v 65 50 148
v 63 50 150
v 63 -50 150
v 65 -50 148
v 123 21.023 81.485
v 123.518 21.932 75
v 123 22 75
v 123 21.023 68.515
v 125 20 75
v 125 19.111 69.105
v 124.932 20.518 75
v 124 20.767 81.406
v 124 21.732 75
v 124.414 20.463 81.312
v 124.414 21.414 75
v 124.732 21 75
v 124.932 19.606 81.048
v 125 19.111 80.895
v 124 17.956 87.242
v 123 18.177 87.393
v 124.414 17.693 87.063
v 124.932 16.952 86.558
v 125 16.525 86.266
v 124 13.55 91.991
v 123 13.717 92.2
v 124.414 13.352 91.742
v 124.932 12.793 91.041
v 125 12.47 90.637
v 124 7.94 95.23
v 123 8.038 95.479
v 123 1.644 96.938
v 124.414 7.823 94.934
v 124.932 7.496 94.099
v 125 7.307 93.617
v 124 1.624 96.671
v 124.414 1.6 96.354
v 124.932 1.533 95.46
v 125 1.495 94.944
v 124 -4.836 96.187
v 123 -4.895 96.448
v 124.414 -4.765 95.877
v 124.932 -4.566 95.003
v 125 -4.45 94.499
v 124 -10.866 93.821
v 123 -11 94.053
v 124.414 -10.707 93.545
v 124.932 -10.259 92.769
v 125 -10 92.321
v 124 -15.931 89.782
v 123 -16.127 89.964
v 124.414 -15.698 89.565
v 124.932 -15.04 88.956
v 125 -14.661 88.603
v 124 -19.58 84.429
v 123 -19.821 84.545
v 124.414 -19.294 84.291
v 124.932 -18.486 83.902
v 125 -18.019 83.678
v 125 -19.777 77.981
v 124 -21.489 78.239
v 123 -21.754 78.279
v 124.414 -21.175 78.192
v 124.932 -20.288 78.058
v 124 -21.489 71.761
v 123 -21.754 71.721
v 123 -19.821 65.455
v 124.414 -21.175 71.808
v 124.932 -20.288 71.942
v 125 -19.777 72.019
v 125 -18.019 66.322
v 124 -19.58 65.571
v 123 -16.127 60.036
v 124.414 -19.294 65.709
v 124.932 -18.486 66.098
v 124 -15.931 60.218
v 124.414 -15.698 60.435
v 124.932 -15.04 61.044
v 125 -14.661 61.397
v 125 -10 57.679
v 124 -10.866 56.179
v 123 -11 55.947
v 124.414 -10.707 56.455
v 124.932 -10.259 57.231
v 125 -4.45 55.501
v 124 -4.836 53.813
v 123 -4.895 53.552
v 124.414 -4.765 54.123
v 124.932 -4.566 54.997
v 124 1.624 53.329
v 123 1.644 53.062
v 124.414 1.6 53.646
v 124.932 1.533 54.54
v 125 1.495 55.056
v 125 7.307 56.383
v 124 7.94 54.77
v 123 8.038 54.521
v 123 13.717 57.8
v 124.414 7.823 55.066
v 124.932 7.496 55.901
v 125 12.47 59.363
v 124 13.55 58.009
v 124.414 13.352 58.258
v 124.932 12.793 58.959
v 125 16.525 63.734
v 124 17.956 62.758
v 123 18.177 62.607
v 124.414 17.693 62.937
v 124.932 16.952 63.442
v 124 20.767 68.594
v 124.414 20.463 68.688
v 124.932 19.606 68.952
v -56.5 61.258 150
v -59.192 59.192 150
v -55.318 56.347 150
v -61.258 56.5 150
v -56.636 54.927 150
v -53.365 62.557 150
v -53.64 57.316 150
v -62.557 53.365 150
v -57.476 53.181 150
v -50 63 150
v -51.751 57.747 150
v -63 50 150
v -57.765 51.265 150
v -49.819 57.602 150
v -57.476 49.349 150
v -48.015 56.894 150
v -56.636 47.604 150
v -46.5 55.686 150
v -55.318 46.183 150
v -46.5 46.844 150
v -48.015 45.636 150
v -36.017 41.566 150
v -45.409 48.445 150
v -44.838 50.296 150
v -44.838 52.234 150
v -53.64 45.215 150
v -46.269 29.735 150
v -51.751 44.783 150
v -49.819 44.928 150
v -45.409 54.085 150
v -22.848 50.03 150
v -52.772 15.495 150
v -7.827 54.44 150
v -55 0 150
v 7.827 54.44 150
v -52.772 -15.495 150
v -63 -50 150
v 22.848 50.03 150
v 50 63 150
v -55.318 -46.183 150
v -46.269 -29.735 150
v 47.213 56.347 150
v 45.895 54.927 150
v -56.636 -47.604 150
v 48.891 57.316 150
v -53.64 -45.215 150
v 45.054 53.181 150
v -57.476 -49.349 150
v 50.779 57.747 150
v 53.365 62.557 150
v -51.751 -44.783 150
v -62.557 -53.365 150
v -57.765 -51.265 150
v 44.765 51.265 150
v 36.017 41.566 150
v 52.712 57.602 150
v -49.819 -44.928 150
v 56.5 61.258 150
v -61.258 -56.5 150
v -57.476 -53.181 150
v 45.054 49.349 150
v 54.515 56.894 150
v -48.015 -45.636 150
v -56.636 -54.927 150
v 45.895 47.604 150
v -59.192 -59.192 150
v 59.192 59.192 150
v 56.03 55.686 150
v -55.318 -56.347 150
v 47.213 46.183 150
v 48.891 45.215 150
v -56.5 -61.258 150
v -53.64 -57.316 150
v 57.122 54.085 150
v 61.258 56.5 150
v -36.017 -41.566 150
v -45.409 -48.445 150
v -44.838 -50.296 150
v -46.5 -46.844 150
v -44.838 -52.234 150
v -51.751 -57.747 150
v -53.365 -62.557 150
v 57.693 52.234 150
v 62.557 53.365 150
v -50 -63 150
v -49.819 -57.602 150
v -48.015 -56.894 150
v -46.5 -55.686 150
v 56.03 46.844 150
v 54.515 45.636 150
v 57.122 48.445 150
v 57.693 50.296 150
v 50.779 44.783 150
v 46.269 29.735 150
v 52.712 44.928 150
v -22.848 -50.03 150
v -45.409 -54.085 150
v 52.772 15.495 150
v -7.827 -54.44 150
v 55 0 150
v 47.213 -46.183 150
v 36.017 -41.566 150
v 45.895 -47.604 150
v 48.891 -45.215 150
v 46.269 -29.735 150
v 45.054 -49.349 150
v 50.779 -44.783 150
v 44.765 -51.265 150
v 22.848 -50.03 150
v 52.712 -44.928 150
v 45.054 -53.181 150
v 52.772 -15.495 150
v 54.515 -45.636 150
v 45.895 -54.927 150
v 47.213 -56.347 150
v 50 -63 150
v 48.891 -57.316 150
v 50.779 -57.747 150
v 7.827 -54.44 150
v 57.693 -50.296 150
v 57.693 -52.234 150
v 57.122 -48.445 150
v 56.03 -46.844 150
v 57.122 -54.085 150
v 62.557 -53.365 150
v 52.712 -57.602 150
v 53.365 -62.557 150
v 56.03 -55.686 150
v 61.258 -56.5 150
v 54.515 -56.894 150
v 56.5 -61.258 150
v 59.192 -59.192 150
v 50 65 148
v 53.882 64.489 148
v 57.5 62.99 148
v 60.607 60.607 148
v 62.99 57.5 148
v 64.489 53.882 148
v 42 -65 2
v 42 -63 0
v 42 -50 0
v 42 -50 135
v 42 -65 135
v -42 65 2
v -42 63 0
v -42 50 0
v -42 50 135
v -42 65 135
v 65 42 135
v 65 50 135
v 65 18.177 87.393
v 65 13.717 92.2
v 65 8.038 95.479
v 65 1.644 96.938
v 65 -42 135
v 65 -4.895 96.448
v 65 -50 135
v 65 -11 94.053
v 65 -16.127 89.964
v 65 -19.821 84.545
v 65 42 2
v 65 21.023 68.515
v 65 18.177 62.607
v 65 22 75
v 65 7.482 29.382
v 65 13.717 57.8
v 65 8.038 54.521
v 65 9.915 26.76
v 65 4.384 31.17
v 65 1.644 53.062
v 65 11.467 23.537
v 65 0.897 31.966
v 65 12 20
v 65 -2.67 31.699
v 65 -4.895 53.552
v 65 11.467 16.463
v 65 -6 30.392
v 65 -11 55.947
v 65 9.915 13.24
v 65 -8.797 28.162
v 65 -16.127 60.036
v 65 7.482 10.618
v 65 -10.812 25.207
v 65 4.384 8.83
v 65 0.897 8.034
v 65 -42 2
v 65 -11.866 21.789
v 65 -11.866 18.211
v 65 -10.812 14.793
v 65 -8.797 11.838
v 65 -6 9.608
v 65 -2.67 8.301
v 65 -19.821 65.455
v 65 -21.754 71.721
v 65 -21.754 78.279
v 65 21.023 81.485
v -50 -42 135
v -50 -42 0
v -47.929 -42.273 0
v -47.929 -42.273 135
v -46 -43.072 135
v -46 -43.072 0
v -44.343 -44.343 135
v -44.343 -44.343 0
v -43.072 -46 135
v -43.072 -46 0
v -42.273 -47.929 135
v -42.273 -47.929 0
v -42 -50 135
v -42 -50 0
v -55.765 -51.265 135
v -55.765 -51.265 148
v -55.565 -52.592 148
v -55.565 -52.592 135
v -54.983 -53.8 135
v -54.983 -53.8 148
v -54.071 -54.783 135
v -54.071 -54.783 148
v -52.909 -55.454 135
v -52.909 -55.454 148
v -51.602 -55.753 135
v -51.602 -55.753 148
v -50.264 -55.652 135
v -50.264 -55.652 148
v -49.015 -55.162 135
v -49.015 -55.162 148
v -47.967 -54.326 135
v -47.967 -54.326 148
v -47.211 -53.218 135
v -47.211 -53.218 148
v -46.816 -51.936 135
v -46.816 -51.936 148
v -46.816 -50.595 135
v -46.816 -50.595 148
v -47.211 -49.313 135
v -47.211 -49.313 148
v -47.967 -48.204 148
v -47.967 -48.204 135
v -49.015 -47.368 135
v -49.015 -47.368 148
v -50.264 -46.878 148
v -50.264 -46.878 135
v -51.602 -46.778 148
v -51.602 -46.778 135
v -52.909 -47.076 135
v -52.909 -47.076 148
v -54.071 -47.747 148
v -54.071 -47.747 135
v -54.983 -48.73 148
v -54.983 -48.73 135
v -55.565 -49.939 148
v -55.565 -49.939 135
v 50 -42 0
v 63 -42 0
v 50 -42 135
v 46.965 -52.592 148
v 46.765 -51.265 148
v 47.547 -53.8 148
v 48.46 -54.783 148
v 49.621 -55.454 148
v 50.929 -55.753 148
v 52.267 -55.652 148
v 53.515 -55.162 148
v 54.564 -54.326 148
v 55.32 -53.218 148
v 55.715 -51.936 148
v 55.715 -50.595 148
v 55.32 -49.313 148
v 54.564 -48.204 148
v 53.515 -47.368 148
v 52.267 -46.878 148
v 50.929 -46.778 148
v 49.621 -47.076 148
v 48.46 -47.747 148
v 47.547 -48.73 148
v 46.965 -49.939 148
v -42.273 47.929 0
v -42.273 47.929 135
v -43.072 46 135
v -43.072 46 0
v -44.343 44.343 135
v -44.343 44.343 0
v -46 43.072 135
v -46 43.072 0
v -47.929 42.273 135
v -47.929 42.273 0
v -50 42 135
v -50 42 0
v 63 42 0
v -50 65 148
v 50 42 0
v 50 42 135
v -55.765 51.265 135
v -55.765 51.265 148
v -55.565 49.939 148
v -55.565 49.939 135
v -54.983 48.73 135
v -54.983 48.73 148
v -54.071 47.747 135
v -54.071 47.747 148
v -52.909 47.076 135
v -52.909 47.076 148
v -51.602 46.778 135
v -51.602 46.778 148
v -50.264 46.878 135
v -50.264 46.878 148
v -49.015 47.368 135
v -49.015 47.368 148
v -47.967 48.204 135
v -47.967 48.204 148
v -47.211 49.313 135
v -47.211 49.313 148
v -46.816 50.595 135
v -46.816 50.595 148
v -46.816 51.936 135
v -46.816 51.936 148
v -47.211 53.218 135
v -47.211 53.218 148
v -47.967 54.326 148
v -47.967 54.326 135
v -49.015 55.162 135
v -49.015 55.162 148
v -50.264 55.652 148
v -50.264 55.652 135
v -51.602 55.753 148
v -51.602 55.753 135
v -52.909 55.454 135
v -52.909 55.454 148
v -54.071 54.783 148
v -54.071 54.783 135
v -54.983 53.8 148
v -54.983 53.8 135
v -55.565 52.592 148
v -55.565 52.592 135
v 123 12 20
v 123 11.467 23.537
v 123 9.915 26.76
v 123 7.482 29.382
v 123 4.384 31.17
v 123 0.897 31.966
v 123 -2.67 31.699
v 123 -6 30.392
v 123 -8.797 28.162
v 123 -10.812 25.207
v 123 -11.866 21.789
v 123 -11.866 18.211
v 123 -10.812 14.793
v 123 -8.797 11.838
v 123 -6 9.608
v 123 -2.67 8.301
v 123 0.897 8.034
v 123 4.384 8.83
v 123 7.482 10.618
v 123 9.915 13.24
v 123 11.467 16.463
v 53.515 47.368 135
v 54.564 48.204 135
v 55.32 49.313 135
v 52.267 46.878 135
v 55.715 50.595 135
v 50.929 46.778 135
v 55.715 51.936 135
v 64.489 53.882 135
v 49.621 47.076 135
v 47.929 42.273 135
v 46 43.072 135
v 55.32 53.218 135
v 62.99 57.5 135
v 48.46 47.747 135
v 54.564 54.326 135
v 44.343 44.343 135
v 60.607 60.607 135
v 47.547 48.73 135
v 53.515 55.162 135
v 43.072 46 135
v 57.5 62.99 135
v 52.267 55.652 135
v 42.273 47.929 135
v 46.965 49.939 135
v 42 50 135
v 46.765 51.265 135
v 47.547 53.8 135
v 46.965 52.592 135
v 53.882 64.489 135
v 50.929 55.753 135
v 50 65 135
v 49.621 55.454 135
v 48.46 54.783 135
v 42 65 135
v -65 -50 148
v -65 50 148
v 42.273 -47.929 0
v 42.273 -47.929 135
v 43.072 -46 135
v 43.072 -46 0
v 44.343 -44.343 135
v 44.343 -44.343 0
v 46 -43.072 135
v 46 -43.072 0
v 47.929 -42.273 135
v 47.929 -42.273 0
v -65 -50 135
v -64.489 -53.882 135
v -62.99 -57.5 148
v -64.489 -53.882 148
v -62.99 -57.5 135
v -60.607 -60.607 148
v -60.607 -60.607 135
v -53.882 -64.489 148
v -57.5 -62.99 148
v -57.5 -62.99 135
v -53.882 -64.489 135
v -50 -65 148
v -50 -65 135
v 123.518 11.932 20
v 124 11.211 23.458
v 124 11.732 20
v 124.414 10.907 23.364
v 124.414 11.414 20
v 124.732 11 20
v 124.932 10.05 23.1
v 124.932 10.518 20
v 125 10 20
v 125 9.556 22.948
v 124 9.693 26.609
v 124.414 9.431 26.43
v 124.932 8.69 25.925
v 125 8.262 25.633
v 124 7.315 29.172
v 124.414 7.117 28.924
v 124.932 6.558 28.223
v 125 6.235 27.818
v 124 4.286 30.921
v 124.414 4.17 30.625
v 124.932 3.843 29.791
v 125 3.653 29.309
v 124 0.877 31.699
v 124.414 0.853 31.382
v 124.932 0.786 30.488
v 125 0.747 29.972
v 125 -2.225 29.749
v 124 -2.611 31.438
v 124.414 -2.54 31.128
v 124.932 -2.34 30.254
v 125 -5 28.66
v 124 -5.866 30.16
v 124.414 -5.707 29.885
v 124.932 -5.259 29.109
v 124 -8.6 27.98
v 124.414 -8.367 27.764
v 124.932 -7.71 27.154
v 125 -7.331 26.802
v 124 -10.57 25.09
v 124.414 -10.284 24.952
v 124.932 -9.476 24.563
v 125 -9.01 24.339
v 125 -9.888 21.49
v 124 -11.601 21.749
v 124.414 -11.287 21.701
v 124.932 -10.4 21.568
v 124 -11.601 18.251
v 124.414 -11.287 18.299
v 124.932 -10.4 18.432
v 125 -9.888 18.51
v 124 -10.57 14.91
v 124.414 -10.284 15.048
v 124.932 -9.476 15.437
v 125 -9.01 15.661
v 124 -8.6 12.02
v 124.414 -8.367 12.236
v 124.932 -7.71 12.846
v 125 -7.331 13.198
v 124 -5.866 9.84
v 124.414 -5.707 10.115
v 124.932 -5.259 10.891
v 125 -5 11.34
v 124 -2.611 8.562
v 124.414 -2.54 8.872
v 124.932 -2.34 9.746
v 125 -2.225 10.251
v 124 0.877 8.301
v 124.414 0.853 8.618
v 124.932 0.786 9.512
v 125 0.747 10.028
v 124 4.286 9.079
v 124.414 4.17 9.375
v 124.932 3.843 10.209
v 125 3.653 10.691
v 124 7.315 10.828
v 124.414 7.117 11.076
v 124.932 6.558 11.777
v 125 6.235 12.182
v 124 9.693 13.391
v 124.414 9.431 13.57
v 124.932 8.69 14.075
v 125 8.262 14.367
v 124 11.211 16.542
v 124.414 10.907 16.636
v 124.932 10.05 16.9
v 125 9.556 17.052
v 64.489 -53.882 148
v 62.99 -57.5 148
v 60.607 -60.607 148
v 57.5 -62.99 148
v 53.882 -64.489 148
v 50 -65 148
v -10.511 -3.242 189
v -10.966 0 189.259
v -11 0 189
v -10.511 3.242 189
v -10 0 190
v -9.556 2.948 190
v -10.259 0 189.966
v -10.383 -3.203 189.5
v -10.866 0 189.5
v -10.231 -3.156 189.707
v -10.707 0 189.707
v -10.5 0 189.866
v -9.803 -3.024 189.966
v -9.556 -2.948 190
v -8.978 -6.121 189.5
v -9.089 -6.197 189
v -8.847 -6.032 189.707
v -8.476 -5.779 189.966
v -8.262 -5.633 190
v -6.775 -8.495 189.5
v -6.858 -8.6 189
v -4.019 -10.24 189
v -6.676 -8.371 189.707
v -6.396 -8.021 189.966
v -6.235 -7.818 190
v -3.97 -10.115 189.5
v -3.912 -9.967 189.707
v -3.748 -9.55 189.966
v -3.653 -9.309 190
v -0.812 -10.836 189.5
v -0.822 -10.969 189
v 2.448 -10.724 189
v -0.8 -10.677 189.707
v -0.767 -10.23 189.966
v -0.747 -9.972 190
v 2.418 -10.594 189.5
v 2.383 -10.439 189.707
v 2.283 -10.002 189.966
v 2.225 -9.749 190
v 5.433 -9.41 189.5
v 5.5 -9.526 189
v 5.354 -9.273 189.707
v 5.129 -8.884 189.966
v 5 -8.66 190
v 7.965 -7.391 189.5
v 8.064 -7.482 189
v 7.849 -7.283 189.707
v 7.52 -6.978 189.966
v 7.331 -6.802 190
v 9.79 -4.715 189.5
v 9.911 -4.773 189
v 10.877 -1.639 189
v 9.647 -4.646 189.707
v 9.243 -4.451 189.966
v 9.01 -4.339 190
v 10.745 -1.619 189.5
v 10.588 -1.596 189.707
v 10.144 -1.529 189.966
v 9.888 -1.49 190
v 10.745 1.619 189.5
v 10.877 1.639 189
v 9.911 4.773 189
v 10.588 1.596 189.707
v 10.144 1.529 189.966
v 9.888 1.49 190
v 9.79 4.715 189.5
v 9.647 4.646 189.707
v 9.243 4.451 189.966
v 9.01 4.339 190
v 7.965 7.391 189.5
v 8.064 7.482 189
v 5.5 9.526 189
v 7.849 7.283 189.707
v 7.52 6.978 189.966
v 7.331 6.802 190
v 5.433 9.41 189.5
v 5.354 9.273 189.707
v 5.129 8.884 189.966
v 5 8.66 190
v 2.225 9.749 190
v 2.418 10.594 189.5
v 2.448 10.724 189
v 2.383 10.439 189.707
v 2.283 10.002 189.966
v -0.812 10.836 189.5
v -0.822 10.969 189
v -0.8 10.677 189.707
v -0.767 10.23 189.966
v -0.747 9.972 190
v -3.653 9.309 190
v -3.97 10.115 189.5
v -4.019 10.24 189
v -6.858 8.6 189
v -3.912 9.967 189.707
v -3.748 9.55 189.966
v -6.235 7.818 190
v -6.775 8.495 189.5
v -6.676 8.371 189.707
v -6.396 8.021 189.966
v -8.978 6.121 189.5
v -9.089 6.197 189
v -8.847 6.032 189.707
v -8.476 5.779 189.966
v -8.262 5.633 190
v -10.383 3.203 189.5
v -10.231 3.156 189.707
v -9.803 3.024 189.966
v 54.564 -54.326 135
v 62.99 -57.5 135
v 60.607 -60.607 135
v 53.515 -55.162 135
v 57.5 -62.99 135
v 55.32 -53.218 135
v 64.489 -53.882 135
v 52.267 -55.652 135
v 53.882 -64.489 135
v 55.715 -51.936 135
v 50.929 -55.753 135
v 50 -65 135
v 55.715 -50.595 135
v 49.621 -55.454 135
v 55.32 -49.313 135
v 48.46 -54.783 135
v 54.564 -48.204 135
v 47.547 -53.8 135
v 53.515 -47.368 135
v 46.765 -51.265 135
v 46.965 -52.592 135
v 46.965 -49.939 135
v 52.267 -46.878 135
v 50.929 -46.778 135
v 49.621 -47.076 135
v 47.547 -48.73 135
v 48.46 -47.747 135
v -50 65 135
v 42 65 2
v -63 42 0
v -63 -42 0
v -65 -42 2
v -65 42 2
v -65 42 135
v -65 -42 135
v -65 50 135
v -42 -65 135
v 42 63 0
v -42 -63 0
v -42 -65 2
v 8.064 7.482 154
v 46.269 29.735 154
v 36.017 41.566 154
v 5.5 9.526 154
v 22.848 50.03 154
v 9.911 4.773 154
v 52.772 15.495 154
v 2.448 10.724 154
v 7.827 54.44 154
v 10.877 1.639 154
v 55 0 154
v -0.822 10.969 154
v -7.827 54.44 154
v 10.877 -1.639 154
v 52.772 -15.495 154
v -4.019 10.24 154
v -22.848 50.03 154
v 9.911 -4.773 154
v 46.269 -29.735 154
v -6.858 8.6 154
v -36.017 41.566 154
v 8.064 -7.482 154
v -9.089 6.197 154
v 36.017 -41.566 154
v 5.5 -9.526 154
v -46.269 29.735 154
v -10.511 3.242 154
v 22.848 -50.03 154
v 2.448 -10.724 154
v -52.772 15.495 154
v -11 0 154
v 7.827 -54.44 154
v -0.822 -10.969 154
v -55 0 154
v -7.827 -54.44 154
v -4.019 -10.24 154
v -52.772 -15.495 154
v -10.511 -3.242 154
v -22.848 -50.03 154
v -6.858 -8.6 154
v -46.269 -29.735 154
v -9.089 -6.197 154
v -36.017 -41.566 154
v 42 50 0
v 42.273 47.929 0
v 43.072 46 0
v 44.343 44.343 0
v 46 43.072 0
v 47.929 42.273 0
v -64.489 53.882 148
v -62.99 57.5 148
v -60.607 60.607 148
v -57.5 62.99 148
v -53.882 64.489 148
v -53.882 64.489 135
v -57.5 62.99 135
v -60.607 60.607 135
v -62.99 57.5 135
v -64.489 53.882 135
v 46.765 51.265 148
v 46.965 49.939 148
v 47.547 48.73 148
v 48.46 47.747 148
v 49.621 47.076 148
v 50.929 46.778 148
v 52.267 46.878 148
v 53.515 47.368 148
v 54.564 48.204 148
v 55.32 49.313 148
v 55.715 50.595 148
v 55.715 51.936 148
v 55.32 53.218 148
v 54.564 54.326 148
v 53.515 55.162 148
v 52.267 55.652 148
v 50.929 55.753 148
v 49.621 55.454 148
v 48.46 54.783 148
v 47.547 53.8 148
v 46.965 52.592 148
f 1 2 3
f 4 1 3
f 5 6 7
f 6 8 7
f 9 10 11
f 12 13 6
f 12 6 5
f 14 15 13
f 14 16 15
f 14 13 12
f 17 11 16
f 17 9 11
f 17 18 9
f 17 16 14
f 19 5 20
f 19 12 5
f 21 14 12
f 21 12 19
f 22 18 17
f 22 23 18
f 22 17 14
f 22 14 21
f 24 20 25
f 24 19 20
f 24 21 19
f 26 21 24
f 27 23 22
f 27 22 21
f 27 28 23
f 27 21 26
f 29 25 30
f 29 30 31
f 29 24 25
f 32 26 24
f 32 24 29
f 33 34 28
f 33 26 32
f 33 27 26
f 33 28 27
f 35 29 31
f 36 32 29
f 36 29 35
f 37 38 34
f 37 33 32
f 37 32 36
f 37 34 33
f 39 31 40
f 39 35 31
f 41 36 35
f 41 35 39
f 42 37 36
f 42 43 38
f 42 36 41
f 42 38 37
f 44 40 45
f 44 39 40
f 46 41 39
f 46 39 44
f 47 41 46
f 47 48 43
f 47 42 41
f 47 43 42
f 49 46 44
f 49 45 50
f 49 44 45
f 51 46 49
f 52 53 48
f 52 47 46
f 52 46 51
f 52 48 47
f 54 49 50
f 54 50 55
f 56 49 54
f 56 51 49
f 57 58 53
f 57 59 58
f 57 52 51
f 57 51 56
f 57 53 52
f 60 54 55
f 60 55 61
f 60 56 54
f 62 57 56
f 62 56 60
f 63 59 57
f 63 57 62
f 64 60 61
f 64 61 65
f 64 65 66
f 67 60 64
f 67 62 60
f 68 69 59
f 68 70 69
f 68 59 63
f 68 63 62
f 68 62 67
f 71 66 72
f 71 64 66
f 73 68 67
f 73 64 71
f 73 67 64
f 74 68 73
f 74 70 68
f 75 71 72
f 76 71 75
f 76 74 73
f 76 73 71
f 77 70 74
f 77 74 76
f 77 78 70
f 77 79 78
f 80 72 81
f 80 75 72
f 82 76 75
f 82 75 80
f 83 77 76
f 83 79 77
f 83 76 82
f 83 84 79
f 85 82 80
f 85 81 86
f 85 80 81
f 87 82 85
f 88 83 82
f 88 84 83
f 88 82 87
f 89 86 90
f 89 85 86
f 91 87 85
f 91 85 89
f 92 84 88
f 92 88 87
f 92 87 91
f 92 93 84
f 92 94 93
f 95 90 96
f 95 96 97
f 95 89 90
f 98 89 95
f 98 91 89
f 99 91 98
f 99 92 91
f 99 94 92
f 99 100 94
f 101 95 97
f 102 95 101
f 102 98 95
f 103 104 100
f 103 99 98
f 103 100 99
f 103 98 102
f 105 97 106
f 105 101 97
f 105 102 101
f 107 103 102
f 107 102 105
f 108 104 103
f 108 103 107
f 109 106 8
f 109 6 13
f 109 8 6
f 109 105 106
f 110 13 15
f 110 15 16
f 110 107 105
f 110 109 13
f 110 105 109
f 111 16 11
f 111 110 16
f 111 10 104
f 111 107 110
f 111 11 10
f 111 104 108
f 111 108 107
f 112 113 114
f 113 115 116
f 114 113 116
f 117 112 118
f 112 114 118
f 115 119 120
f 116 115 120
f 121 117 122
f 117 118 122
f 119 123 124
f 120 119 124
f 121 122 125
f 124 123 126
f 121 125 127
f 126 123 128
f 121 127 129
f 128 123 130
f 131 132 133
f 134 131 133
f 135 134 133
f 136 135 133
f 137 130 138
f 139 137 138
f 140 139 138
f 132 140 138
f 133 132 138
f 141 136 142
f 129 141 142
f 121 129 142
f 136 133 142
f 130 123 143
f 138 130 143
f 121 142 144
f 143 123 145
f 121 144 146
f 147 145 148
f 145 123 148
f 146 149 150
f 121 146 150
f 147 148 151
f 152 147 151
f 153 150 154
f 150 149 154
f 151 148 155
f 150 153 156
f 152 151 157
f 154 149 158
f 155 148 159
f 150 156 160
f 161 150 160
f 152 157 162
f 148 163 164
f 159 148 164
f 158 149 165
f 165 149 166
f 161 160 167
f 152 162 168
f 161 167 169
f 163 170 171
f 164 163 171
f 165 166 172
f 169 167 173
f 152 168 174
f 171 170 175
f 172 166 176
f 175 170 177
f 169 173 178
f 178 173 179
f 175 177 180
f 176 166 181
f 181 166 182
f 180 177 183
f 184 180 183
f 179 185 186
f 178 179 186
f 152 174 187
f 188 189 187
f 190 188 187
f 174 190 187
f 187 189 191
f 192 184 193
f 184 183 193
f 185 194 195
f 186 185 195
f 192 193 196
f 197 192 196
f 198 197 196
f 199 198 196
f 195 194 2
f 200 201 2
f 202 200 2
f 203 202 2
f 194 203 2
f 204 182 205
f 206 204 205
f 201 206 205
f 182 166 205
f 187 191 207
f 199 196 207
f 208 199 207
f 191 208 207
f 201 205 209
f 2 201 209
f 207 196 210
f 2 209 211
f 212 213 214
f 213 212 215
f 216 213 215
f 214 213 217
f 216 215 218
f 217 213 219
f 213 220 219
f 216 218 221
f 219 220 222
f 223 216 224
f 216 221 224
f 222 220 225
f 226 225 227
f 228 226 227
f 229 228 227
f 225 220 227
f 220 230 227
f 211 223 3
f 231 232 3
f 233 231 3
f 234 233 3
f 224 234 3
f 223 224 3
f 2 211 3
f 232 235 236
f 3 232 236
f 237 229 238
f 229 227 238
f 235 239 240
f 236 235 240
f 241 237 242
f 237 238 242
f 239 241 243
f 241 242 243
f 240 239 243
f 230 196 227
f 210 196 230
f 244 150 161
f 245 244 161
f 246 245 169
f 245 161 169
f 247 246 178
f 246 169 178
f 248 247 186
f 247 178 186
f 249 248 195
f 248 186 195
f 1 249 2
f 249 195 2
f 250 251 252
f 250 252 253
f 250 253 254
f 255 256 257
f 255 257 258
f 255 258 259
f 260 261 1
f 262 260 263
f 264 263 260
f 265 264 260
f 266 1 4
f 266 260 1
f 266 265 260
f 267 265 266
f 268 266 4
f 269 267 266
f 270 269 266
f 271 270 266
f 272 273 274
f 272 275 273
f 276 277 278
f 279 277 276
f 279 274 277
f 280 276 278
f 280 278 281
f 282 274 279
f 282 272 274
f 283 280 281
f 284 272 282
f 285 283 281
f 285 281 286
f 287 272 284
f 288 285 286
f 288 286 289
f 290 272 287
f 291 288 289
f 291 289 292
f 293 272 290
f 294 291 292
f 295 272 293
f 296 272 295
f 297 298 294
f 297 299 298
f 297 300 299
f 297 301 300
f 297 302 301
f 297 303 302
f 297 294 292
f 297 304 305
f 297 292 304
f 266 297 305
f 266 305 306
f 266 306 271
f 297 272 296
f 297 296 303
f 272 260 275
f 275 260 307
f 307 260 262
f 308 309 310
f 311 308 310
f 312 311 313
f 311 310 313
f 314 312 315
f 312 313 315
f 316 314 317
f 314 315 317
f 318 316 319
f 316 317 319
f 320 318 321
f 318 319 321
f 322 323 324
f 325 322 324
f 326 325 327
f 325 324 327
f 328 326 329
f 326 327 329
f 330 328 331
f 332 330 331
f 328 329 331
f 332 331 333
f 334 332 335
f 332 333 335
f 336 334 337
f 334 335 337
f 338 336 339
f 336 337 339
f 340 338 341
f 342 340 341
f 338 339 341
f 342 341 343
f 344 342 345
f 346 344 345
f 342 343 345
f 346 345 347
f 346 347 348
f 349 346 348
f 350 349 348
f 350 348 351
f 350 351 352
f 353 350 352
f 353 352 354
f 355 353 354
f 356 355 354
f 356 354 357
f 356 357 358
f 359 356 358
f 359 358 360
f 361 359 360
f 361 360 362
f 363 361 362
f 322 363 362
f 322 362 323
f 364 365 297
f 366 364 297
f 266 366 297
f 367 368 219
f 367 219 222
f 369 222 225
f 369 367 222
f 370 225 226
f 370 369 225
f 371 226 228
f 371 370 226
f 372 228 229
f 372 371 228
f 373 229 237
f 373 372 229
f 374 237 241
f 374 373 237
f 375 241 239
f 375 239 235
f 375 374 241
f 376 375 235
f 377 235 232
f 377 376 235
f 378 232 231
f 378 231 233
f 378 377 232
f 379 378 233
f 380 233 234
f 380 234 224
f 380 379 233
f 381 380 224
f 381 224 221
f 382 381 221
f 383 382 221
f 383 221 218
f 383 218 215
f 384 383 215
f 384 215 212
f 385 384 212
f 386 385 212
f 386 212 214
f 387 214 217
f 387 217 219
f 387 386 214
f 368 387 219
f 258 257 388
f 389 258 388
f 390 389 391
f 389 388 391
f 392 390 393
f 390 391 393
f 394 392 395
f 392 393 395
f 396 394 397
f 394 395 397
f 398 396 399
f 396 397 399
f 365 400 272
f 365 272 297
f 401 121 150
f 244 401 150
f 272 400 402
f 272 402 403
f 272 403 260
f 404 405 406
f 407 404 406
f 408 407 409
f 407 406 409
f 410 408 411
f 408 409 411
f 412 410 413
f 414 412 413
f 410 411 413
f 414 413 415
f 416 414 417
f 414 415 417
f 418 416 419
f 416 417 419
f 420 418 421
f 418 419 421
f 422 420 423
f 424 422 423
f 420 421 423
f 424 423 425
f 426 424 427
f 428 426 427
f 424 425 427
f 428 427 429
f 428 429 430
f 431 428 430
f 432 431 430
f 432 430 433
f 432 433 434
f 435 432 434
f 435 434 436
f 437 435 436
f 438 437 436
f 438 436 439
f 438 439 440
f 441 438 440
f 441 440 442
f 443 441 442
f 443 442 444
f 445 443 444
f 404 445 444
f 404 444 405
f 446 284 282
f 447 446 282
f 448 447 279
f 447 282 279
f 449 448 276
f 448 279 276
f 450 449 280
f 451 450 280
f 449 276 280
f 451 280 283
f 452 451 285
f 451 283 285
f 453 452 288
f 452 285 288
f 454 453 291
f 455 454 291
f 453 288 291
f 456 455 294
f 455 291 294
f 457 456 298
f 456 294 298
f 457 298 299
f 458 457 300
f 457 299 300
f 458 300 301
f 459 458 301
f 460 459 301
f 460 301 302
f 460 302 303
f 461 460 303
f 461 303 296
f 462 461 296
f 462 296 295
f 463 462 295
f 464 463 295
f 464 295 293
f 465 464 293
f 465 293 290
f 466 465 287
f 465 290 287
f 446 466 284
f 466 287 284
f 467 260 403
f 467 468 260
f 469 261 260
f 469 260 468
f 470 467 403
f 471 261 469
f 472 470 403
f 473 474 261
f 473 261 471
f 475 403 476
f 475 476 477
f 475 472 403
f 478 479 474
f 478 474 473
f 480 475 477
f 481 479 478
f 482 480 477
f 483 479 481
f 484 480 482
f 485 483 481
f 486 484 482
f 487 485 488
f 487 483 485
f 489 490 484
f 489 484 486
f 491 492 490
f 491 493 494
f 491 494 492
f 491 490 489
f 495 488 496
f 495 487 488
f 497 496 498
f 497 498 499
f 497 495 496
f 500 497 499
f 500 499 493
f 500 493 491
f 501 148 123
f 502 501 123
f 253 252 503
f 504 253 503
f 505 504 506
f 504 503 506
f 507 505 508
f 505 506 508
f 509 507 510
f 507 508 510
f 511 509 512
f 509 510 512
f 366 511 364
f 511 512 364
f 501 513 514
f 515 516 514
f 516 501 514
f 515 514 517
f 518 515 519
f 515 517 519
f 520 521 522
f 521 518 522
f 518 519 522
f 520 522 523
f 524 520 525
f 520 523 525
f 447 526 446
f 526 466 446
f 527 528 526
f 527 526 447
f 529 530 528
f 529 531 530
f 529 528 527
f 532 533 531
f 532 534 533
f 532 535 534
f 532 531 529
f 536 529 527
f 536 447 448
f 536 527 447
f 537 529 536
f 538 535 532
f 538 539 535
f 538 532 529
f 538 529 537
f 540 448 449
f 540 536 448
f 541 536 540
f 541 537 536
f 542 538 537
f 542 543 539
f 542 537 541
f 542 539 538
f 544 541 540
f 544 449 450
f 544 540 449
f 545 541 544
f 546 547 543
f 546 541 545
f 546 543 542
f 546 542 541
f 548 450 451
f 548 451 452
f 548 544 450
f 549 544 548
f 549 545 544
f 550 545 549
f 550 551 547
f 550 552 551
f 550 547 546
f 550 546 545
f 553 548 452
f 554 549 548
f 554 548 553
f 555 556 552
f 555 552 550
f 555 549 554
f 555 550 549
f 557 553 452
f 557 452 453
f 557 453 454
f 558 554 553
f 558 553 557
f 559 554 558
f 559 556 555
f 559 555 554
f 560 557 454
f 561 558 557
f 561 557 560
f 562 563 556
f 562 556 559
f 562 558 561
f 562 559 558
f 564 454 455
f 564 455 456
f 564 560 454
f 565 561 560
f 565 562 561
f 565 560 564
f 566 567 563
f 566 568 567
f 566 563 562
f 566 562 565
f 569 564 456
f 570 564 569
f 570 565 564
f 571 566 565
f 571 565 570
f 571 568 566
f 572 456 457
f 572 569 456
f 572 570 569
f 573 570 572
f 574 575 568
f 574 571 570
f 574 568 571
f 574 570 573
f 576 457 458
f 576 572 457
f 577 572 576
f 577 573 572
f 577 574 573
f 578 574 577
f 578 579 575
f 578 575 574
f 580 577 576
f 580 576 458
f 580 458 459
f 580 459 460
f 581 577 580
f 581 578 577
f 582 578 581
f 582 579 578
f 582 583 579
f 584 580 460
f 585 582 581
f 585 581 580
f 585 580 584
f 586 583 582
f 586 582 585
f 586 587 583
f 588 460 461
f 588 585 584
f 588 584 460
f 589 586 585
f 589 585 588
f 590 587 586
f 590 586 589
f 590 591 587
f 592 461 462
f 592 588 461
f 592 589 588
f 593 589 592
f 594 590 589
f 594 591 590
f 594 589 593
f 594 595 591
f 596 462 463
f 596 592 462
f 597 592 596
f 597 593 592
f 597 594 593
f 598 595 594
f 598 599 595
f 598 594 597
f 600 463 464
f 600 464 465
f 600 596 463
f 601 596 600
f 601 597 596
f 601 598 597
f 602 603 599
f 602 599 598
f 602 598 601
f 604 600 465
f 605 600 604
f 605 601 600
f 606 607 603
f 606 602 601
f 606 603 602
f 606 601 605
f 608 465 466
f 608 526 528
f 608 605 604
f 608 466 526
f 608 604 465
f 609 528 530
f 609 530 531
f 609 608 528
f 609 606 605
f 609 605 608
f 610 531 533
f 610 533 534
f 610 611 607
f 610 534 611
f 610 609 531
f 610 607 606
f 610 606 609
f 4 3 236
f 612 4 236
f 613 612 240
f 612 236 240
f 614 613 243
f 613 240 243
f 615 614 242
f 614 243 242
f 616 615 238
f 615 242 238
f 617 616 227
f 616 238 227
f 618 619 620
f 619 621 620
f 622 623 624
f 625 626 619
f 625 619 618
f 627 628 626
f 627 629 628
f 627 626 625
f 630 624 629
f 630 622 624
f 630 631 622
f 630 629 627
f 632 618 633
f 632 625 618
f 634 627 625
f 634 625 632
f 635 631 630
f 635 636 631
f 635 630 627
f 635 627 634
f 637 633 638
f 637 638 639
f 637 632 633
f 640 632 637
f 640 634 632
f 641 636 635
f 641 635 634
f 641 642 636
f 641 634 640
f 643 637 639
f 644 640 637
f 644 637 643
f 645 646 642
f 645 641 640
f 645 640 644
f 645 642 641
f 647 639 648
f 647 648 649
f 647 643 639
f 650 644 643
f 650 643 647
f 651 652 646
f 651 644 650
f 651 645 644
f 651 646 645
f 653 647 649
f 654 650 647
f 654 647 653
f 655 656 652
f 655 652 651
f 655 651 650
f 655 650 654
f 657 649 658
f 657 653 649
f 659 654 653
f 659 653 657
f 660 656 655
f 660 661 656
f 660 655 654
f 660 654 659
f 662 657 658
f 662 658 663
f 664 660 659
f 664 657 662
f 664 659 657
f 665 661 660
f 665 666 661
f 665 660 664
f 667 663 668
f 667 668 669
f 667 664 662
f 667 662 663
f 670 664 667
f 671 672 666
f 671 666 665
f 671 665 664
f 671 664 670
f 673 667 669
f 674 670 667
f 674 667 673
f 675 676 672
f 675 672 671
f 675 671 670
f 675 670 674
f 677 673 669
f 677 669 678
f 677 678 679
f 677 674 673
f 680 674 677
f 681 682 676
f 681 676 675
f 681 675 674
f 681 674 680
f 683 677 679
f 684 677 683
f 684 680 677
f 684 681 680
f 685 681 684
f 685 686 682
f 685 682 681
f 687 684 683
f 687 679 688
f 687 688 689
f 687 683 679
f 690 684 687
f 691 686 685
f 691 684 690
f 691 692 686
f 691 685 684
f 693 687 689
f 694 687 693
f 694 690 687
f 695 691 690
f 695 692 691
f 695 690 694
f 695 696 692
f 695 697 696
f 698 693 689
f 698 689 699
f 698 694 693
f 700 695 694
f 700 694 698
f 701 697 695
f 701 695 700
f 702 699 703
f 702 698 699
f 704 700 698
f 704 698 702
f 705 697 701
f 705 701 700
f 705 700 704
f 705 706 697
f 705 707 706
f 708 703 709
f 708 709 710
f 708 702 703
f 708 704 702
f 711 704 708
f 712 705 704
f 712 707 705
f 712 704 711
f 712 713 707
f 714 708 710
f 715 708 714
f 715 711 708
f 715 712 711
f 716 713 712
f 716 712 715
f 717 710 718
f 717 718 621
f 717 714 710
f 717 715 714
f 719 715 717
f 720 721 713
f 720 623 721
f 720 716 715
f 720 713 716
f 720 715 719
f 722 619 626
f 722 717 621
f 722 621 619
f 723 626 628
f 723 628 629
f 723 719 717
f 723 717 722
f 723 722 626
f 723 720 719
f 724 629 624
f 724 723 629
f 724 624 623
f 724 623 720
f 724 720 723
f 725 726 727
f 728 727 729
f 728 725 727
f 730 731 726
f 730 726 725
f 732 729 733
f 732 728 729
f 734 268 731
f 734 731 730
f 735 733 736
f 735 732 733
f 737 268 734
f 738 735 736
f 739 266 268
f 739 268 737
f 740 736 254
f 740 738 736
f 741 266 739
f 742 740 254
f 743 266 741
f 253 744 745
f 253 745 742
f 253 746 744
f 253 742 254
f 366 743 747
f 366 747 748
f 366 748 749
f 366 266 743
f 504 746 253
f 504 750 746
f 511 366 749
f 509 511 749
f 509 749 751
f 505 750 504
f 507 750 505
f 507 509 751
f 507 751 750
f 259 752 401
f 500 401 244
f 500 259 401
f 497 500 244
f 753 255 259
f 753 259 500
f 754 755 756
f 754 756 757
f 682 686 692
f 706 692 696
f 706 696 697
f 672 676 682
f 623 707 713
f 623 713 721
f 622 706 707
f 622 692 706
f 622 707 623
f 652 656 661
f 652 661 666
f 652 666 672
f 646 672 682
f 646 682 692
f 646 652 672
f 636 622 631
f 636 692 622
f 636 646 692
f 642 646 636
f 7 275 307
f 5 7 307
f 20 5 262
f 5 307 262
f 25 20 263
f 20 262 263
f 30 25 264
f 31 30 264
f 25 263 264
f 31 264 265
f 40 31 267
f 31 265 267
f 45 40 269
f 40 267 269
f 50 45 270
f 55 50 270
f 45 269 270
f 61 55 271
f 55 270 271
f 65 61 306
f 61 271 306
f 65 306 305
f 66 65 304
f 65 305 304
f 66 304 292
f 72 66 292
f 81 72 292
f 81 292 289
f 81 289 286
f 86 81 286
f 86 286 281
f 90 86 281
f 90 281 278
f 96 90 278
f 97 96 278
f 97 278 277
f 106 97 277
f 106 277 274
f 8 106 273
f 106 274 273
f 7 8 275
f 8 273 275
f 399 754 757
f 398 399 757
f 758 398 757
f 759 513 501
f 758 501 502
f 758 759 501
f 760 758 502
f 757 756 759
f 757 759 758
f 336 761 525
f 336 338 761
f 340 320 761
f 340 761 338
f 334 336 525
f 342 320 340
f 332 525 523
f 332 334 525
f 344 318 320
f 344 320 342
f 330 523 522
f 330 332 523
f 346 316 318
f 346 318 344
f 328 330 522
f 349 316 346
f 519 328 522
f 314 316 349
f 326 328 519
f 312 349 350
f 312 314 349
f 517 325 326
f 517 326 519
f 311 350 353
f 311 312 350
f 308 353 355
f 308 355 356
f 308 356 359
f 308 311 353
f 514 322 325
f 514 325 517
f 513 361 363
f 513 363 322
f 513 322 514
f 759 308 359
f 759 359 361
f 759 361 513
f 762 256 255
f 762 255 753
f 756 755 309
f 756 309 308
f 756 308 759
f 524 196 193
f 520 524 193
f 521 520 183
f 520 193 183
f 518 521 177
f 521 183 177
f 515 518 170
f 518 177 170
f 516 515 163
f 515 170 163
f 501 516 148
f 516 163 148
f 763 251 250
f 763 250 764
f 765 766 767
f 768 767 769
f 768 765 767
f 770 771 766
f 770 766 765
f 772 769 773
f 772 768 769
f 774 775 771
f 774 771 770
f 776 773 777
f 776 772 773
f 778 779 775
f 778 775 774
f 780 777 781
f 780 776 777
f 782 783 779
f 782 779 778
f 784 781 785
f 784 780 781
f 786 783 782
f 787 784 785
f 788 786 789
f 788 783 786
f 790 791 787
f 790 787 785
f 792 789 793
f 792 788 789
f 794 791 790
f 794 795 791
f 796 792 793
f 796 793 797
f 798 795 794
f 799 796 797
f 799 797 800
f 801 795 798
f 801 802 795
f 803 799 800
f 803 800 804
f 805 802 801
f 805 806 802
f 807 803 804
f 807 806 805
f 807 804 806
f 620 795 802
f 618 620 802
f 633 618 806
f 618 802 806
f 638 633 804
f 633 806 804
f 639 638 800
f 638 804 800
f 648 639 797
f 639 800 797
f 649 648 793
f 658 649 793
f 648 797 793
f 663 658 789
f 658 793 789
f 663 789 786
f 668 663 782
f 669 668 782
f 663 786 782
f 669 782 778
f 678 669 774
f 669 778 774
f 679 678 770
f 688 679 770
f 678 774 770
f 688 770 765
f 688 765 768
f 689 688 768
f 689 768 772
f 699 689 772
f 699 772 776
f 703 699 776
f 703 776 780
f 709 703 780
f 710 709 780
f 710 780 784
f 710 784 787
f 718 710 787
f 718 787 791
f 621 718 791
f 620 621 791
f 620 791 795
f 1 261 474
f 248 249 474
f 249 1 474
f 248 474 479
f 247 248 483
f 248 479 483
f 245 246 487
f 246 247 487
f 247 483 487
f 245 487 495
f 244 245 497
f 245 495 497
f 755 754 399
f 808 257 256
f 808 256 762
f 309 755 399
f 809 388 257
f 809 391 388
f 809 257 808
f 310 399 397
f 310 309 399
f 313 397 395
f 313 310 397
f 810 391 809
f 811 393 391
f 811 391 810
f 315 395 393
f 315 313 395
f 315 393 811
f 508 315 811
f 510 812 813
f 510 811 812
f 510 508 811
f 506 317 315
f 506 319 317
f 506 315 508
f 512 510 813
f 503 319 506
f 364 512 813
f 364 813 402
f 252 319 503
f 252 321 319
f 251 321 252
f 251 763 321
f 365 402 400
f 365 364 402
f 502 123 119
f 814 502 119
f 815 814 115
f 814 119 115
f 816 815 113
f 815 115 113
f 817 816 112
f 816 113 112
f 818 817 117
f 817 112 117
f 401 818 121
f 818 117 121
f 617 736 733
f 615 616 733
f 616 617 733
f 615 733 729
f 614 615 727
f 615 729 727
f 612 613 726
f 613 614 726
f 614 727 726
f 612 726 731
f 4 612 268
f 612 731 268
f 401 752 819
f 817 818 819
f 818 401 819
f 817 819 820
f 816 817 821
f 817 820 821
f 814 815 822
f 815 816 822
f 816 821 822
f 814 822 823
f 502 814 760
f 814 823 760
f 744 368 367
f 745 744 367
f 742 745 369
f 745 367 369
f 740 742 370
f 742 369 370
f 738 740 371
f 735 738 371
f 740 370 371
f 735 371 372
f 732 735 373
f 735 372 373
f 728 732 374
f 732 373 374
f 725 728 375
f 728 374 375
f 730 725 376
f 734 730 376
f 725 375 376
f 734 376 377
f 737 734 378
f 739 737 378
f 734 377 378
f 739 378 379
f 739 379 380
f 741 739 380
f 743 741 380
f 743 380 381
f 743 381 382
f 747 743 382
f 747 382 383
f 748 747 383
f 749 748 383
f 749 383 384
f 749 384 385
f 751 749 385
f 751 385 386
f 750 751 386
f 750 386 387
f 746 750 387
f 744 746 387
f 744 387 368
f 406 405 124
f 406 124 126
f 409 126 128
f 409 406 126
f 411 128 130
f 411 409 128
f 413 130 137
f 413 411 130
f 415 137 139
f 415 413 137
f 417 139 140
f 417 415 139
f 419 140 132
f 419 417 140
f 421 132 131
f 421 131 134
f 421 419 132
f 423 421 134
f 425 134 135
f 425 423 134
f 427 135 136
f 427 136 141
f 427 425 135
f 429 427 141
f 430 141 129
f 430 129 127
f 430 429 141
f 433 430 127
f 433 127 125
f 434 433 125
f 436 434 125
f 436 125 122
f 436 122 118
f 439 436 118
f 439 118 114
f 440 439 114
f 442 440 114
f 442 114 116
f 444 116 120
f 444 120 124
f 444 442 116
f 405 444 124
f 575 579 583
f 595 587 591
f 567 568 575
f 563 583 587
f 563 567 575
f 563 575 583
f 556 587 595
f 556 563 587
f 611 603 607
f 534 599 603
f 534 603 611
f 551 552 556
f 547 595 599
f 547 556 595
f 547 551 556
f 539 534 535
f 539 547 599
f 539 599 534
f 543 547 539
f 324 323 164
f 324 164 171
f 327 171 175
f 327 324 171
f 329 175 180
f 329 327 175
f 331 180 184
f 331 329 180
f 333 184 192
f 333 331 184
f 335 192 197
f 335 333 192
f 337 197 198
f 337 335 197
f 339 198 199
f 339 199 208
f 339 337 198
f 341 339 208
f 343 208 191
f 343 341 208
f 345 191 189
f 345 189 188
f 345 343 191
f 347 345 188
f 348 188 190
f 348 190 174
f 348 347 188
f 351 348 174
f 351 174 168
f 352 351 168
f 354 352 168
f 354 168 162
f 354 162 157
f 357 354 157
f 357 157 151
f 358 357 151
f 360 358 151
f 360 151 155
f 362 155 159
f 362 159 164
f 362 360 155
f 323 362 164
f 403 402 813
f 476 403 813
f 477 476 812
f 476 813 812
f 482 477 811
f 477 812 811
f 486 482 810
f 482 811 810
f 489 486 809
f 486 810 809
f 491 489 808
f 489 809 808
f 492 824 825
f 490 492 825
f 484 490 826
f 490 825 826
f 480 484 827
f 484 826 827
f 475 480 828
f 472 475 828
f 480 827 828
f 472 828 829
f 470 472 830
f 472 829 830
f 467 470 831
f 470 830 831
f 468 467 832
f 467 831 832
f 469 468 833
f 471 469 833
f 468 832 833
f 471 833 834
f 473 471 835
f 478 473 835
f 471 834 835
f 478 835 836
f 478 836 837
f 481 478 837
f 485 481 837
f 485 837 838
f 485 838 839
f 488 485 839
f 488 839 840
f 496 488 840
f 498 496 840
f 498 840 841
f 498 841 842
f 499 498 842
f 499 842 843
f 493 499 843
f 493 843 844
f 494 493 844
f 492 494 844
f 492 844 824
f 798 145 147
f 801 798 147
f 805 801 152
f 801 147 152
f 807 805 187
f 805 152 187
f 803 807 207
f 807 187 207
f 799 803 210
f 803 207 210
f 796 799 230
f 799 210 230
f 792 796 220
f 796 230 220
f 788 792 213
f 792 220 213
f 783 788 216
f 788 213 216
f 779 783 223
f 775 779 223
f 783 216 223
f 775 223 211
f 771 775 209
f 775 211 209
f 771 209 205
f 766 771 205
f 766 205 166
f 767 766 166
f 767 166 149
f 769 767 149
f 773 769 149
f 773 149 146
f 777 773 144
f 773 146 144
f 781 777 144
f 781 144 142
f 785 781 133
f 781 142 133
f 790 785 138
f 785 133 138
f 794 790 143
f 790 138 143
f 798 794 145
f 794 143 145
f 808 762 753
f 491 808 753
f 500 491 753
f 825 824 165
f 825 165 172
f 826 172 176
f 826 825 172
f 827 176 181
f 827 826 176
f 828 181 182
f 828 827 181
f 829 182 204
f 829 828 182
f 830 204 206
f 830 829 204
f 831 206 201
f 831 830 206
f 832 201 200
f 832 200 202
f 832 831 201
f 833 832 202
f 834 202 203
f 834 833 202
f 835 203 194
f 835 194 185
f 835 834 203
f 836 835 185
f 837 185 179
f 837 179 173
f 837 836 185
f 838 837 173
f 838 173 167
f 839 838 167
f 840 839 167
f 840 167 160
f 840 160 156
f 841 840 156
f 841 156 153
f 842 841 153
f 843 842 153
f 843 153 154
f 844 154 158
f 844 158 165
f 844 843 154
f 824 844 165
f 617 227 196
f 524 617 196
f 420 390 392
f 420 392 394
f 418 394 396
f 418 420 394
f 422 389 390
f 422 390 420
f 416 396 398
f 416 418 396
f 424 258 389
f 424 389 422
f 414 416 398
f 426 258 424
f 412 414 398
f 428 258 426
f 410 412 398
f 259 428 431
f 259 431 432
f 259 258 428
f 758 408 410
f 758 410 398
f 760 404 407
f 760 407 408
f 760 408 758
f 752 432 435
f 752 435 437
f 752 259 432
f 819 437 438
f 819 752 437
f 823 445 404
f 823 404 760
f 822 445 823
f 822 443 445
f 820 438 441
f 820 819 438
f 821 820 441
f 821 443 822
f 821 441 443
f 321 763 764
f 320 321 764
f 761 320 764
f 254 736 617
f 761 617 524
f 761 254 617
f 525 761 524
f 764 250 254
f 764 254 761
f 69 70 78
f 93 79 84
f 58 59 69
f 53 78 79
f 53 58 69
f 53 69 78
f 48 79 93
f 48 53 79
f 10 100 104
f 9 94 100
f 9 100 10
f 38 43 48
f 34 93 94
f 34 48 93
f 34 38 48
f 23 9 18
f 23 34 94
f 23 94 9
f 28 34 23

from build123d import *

# Parameters (mm, degrees)
PAD_DEPTH            = 150
SKETCH001_R          = 11
PAD001_DEPTH         = 40
FILLET_R             = 1
SKETCH002_R          = 22
SKETCH002_R_2        = 12
PAD002_DEPTH         = 60
SKETCH003_R          = 4.5
POCKET_DEPTH         = 25
FILLET001_R          = 2
CHAMFER_SIZE         = 2
SKETCH004_R          = 55
PAD003_DEPTH         = 4
POCKET001_DEPTH      = 135
BODY_PLACEMENT_ANGLE = 180


with BuildPart() as part:
    # Sketch → Pad (new body)
    with BuildSketch(Plane.XY):
        with BuildLine():
            Line((-50, 65), (50, 65))
            ThreePointArc((65, 50), (60.606602, 60.606602), (50, 65))
            Line((65, 50), (65, -50))
            ThreePointArc((50, -65), (60.606602, -60.606602), (65, -50))
            Line((50, -65), (-50, -65))
            ThreePointArc((-65, -50), (-60.606602, -60.606602), (-50, -65))
            Line((-65, -50), (-65, 50))
            ThreePointArc((-50, 65), (-60.606602, 60.606602), (-65, 50))
        make_face()
    extrude(amount=PAD_DEPTH)

    # Sketch001 (on Face10 of Pad) → Pad001 (join)
    with BuildSketch(Plane.XY.offset(150)):
        Circle(SKETCH001_R)
    extrude(amount=PAD001_DEPTH)

    # Fillet
    fillet_edges = [part.edges().sort_by_distance(p)[0] for p in [
        (-11, 0, 190),
    ]]
    fillet(fillet_edges, radius=FILLET_R)

    # Sketch002 (on Face8 of Fillet) → Pad002 (join)
    with BuildSketch(Plane(origin=(-65, 0, 0), x_dir=(0, -1, 0), z_dir=(-1, 0, 0))):
        with Locations((0, 75)):
            Circle(SKETCH002_R)
        with Locations((0, 20)):
            Circle(SKETCH002_R_2)
    extrude(amount=PAD002_DEPTH)

    # Sketch003 (on Face3 of Pad002) → Pocket (cut)
    with BuildSketch(Plane.XY.offset(150)):
        with Locations((-51.265242, 51.265242)):
            Circle(SKETCH003_R)
        with Locations((51.265242, 51.265242)):
            Circle(SKETCH003_R)
        with Locations((51.265242, -51.265242)):
            Circle(SKETCH003_R)
        with Locations((-51.265242, -51.265242)):
            Circle(SKETCH003_R)
    extrude(amount=-POCKET_DEPTH, mode=Mode.SUBTRACT)

    # Fillet001
    fillet001_edges = [part.edges().sort_by_distance(p)[0] for p in [
        (-125, 12, 20),
        (-125, 22, 75),
    ]]
    fillet(fillet001_edges, radius=FILLET001_R)

    # Chamfer
    chamfer_edges = [part.edges().sort_by_distance(p)[0] for p in [
        (-65, 0, 150),
        (0, 65, 150),
        (65, 0, 150),
        (0, -65, 150),
        (60.606602, -60.606602, 150),
        (-60.606602, -60.606602, 150),
        (-60.606602, 60.606602, 150),
        (60.606602, 60.606602, 150),
        (-55.765242, -51.265242, 150),
        (46.765242, -51.265242, 150),
        (-55.765242, 51.265242, 150),
        (-11, 0, 150),
        (46.765242, 51.265242, 150),
        (-65, 0, 0),
        (-60.606602, 60.606602, 0),
        (-60.606602, -60.606602, 0),
        (0, 65, 0),
        (60.606602, 60.606602, 0),
        (65, 0, 0),
        (60.606602, -60.606602, 0),
        (0, -65, 0),
    ]]
    chamfer(chamfer_edges, length=CHAMFER_SIZE)

    # Sketch004 (on Face13 of Chamfer) → Pad003 (join)
    with BuildSketch(Plane.XY.offset(150)):
        Circle(SKETCH004_R)
    extrude(amount=PAD003_DEPTH)

    # Sketch005 (on Face11 of Pad003) → Pocket001 (cut)
    with BuildSketch(Plane(origin=(0, 0, 0), x_dir=(1, 0, 0), z_dir=(0, 0, -1))):
        with BuildLine():
            ThreePointArc((-42, -50), (-44.343146, -44.343146), (-50, -42))
            Line((-50, -42), (-65, -42))
            Line((-65, -50), (-65, -42))
            ThreePointArc((-65, -50), (-60.606602, -60.606602), (-50, -65))
            Line((-50, -65), (-42, -65))
            Line((-42, -50), (-42, -65))
        make_face()
        with BuildLine():
            ThreePointArc((50, -42), (44.343146, -44.343146), (42, -50))
            Line((42, -50), (42, -65))
            Line((50, -65), (42, -65))
            ThreePointArc((50, -65), (60.606602, -60.606602), (65, -50))
            Line((65, -50), (65, -42))
            Line((50, -42), (65, -42))
        make_face()
        with BuildLine():
            ThreePointArc((-50, 42), (-44.343146, 44.343146), (-42, 50))
            Line((-42, 50), (-42, 65))
            Line((-50, 65), (-42, 65))
            ThreePointArc((-50, 65), (-60.606602, 60.606602), (-65, 50))
            Line((-65, 50), (-65, 42))
            Line((-50, 42), (-65, 42))
        make_face()
        with BuildLine():
            ThreePointArc((42, 50), (44.343146, 44.343146), (50, 42))
            Line((50, 42), (65, 42))
            Line((65, 50), (65, 42))
            ThreePointArc((65, 50), (60.606602, 60.606602), (50, 65))
            Line((50, 65), (42, 65))
            Line((42, 50), (42, 65))
        make_face()
    extrude(amount=-POCKET001_DEPTH, mode=Mode.SUBTRACT)


with BuildPart() as part_1:
    # Body placement: moved
    add(part.part.rotate(Axis((0, 0, 0), (0, 0, 1)), BODY_PLACEMENT_ANGLE))


solid = part_1.part
